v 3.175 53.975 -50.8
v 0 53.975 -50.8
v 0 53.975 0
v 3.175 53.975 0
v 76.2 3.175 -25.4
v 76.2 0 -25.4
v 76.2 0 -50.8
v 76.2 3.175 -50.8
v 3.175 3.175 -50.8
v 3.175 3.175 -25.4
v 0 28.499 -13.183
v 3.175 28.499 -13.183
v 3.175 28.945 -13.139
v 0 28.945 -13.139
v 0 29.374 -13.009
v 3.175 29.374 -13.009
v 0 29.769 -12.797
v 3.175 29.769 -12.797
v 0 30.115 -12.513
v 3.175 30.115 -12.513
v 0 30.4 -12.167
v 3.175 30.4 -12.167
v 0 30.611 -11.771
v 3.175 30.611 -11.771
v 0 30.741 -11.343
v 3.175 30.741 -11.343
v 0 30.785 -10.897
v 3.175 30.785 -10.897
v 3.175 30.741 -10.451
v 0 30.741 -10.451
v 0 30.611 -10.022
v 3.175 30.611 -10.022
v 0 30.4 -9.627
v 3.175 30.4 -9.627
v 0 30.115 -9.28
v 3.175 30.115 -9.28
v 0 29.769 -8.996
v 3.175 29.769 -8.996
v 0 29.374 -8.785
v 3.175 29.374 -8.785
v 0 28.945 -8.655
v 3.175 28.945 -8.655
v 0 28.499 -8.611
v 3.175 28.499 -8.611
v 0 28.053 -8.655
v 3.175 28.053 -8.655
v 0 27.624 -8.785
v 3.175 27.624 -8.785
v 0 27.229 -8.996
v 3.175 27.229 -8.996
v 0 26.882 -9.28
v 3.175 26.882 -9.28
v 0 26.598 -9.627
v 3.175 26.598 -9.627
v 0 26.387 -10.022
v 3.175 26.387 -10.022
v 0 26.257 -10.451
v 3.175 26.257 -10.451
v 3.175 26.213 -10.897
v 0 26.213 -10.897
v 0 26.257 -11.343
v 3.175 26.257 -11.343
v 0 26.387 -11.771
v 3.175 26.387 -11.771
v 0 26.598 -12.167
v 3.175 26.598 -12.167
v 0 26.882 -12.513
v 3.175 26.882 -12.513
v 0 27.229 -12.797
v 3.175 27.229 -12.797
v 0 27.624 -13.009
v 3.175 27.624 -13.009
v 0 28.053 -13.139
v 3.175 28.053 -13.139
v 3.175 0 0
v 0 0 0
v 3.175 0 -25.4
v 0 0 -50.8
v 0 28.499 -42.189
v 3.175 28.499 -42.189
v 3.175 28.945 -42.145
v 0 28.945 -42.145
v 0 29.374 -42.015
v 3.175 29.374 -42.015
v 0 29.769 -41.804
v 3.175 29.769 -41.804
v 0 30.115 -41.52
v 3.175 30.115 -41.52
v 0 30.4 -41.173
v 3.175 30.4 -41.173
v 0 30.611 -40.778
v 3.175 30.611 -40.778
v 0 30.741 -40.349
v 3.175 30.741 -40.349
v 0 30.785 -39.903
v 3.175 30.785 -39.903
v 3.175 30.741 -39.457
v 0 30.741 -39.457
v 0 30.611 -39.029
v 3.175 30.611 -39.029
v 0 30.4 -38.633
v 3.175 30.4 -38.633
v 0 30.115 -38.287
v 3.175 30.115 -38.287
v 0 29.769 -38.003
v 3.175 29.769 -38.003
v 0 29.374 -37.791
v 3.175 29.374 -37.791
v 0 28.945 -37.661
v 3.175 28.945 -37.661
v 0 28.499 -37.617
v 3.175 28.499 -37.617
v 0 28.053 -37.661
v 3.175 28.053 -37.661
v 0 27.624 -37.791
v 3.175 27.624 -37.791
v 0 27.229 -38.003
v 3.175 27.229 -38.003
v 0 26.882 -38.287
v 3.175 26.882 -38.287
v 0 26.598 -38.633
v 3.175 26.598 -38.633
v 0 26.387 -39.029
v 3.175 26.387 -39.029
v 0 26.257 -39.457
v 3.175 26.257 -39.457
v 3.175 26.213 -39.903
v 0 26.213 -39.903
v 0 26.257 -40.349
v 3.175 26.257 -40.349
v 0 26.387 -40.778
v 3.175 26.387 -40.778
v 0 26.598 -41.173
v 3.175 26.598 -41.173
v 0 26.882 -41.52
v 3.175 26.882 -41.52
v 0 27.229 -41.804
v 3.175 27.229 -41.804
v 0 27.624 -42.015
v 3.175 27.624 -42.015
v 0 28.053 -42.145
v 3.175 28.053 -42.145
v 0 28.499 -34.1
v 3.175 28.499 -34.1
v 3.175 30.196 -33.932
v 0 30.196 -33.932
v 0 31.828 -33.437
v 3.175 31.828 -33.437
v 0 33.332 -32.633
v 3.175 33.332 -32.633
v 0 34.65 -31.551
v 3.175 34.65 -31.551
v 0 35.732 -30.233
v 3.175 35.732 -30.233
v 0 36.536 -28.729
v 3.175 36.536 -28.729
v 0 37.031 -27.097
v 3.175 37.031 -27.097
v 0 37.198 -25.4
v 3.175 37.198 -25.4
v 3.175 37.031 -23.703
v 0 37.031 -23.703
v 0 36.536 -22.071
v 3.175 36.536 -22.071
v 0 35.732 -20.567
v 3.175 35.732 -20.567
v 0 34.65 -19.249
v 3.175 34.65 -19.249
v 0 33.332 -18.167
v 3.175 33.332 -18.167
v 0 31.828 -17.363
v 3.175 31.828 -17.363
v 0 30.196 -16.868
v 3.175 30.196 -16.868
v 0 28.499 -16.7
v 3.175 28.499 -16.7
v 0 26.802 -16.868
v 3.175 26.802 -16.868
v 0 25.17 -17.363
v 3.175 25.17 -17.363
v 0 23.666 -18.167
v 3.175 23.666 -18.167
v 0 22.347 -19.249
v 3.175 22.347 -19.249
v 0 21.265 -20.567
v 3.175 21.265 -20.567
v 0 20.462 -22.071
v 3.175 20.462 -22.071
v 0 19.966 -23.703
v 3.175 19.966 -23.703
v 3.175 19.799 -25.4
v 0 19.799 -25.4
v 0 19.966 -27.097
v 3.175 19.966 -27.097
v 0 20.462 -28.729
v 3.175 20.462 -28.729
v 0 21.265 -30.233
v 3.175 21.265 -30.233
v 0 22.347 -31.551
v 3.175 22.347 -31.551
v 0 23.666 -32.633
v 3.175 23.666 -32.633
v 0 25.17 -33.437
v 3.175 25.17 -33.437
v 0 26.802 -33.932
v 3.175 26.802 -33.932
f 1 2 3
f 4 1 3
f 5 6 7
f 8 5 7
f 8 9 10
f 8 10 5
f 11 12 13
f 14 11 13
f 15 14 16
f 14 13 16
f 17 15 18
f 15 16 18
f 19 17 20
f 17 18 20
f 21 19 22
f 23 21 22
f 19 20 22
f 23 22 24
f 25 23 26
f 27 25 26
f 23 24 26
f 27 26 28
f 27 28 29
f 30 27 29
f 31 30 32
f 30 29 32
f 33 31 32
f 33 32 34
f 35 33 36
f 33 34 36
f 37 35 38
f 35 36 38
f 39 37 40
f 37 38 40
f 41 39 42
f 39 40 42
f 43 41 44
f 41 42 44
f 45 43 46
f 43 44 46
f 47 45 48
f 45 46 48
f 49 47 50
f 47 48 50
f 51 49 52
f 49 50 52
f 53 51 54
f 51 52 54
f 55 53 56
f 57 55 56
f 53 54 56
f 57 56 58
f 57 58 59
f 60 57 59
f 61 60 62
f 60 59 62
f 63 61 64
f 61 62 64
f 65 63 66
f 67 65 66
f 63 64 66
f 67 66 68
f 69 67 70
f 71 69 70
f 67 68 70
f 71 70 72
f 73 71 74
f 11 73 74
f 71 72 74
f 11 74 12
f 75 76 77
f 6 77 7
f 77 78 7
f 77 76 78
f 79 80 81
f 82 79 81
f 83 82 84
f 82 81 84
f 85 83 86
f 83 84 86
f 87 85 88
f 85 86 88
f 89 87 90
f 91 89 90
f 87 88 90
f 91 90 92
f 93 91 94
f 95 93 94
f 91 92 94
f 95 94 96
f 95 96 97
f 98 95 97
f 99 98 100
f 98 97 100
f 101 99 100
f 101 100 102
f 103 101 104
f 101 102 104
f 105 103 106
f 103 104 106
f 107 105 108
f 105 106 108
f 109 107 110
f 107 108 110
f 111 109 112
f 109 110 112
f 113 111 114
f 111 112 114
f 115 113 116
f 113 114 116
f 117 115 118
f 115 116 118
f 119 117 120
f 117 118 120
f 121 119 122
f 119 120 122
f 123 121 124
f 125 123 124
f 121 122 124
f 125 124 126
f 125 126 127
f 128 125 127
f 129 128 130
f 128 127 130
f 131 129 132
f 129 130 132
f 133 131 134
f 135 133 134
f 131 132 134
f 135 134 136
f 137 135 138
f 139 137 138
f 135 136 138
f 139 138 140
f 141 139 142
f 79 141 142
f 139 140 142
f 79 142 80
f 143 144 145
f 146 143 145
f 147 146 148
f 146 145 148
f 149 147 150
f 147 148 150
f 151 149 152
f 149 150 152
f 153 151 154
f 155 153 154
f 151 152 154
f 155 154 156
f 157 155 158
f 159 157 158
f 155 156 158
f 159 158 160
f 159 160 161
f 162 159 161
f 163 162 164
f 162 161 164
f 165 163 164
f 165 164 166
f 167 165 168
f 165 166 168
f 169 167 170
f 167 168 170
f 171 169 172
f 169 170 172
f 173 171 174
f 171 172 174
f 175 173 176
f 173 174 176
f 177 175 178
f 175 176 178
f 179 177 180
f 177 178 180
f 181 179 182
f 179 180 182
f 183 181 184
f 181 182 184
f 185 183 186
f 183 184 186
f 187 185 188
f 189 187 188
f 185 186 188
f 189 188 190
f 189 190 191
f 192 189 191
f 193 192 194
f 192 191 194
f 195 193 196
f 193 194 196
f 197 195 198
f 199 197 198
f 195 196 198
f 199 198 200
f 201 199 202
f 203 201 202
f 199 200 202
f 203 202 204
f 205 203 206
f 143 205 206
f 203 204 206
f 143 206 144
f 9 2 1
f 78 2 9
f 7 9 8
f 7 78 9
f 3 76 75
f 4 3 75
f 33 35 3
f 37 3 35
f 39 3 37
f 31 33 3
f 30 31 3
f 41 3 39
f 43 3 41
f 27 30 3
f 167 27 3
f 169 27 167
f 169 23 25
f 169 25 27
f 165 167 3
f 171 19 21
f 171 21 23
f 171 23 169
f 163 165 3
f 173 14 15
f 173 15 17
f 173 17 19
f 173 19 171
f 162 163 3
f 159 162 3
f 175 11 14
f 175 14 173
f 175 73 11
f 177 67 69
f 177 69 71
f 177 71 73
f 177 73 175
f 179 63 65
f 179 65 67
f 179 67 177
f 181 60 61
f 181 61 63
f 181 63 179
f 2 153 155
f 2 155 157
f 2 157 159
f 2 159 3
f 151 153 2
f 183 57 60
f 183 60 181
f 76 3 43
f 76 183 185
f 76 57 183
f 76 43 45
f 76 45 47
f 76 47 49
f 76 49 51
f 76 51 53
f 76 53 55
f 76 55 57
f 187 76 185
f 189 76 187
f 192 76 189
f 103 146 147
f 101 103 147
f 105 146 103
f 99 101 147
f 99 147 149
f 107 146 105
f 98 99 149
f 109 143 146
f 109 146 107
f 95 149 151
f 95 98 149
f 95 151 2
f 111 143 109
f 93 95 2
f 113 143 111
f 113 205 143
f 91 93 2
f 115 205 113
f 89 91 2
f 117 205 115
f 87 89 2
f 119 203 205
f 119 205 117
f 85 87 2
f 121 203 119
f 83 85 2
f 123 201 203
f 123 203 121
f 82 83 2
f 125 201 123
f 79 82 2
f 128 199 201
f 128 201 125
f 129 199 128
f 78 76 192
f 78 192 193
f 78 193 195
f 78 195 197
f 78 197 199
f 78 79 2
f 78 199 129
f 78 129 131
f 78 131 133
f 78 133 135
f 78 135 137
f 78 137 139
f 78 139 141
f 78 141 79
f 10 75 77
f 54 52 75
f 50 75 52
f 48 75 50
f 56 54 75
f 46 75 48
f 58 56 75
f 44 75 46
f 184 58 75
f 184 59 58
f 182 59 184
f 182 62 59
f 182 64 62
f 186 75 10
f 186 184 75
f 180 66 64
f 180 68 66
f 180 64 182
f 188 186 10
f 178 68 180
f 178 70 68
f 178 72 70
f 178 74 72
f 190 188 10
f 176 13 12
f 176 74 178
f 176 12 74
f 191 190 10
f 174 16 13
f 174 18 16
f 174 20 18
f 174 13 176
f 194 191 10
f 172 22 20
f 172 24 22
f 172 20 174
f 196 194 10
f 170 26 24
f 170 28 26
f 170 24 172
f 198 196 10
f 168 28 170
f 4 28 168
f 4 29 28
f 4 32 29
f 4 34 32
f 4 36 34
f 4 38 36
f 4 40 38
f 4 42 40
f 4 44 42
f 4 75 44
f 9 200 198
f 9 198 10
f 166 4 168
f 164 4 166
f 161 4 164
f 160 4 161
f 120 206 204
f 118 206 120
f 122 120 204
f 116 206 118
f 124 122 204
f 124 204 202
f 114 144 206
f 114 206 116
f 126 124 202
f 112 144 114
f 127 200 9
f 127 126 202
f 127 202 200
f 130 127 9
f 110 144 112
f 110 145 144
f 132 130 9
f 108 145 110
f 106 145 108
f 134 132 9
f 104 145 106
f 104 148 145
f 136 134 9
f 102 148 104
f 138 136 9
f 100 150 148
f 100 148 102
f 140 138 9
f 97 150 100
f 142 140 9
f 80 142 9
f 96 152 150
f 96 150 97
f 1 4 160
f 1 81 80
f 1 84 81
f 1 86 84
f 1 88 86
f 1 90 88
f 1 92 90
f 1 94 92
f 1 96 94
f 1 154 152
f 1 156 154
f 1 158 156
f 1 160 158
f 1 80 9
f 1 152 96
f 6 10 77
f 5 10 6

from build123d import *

# Parameters (mm, degrees)
SKETCH1_W           = 76.2
SKETCH1_H           = 50.8
BOSS_EXTRUDE1_DEPTH = 3.175
SKETCH2_W           = 50.8
SKETCH2_H           = 53.975
BOSS_EXTRUDE2_DEPTH = 3.175
SKETCH4_R           = 2.286
SKETCH4_R_2         = 8.6995
CUT_EXTRUDE2_DEPTH  = 3.175
SKETCH6_W           = 73.025
SKETCH6_H           = 25.4
CUT_EXTRUDE3_DEPTH  = 3.175


with BuildPart() as part:
    # Sketch1 → Boss-Extrude1 (new body)
    with BuildSketch(Plane(origin=(0, 0, 0), x_dir=(1, 0, 0), z_dir=(0, 1, 0))):
        with Locations((38.1, 25.4)):
            Rectangle(SKETCH1_W, SKETCH1_H)
    extrude(amount=BOSS_EXTRUDE1_DEPTH)

    # Sketch2 → Boss-Extrude2 (add)
    with BuildSketch(Plane.ZY):
        with Locations((-25.4, 26.9875)):
            Rectangle(SKETCH2_W, SKETCH2_H)
    extrude(amount=-BOSS_EXTRUDE2_DEPTH)

    # Sketch4 → Cut-Extrude2 (cut)
    with BuildSketch(Plane(origin=(3.175, 0, 0), x_dir=(0, 0, -1), z_dir=(1, 0, 0))):
        with Locations((10.8966, 28.4988)):
            Circle(SKETCH4_R)
        with Locations((39.9034, 28.4988)):
            Circle(SKETCH4_R)
        with Locations((25.4, 28.4988)):
            Circle(SKETCH4_R_2)
    extrude(amount=-CUT_EXTRUDE2_DEPTH, mode=Mode.SUBTRACT)

    # Sketch6 → Cut-Extrude3 (cut)
    with BuildSketch(Plane(origin=(0, 3.175, 0), x_dir=(1, 0, 0), z_dir=(0, 1, 0))):
        with Locations((39.6875, 12.7)):
            Rectangle(SKETCH6_W, SKETCH6_H)
    extrude(amount=-CUT_EXTRUDE3_DEPTH, mode=Mode.SUBTRACT)


solid = part.part
